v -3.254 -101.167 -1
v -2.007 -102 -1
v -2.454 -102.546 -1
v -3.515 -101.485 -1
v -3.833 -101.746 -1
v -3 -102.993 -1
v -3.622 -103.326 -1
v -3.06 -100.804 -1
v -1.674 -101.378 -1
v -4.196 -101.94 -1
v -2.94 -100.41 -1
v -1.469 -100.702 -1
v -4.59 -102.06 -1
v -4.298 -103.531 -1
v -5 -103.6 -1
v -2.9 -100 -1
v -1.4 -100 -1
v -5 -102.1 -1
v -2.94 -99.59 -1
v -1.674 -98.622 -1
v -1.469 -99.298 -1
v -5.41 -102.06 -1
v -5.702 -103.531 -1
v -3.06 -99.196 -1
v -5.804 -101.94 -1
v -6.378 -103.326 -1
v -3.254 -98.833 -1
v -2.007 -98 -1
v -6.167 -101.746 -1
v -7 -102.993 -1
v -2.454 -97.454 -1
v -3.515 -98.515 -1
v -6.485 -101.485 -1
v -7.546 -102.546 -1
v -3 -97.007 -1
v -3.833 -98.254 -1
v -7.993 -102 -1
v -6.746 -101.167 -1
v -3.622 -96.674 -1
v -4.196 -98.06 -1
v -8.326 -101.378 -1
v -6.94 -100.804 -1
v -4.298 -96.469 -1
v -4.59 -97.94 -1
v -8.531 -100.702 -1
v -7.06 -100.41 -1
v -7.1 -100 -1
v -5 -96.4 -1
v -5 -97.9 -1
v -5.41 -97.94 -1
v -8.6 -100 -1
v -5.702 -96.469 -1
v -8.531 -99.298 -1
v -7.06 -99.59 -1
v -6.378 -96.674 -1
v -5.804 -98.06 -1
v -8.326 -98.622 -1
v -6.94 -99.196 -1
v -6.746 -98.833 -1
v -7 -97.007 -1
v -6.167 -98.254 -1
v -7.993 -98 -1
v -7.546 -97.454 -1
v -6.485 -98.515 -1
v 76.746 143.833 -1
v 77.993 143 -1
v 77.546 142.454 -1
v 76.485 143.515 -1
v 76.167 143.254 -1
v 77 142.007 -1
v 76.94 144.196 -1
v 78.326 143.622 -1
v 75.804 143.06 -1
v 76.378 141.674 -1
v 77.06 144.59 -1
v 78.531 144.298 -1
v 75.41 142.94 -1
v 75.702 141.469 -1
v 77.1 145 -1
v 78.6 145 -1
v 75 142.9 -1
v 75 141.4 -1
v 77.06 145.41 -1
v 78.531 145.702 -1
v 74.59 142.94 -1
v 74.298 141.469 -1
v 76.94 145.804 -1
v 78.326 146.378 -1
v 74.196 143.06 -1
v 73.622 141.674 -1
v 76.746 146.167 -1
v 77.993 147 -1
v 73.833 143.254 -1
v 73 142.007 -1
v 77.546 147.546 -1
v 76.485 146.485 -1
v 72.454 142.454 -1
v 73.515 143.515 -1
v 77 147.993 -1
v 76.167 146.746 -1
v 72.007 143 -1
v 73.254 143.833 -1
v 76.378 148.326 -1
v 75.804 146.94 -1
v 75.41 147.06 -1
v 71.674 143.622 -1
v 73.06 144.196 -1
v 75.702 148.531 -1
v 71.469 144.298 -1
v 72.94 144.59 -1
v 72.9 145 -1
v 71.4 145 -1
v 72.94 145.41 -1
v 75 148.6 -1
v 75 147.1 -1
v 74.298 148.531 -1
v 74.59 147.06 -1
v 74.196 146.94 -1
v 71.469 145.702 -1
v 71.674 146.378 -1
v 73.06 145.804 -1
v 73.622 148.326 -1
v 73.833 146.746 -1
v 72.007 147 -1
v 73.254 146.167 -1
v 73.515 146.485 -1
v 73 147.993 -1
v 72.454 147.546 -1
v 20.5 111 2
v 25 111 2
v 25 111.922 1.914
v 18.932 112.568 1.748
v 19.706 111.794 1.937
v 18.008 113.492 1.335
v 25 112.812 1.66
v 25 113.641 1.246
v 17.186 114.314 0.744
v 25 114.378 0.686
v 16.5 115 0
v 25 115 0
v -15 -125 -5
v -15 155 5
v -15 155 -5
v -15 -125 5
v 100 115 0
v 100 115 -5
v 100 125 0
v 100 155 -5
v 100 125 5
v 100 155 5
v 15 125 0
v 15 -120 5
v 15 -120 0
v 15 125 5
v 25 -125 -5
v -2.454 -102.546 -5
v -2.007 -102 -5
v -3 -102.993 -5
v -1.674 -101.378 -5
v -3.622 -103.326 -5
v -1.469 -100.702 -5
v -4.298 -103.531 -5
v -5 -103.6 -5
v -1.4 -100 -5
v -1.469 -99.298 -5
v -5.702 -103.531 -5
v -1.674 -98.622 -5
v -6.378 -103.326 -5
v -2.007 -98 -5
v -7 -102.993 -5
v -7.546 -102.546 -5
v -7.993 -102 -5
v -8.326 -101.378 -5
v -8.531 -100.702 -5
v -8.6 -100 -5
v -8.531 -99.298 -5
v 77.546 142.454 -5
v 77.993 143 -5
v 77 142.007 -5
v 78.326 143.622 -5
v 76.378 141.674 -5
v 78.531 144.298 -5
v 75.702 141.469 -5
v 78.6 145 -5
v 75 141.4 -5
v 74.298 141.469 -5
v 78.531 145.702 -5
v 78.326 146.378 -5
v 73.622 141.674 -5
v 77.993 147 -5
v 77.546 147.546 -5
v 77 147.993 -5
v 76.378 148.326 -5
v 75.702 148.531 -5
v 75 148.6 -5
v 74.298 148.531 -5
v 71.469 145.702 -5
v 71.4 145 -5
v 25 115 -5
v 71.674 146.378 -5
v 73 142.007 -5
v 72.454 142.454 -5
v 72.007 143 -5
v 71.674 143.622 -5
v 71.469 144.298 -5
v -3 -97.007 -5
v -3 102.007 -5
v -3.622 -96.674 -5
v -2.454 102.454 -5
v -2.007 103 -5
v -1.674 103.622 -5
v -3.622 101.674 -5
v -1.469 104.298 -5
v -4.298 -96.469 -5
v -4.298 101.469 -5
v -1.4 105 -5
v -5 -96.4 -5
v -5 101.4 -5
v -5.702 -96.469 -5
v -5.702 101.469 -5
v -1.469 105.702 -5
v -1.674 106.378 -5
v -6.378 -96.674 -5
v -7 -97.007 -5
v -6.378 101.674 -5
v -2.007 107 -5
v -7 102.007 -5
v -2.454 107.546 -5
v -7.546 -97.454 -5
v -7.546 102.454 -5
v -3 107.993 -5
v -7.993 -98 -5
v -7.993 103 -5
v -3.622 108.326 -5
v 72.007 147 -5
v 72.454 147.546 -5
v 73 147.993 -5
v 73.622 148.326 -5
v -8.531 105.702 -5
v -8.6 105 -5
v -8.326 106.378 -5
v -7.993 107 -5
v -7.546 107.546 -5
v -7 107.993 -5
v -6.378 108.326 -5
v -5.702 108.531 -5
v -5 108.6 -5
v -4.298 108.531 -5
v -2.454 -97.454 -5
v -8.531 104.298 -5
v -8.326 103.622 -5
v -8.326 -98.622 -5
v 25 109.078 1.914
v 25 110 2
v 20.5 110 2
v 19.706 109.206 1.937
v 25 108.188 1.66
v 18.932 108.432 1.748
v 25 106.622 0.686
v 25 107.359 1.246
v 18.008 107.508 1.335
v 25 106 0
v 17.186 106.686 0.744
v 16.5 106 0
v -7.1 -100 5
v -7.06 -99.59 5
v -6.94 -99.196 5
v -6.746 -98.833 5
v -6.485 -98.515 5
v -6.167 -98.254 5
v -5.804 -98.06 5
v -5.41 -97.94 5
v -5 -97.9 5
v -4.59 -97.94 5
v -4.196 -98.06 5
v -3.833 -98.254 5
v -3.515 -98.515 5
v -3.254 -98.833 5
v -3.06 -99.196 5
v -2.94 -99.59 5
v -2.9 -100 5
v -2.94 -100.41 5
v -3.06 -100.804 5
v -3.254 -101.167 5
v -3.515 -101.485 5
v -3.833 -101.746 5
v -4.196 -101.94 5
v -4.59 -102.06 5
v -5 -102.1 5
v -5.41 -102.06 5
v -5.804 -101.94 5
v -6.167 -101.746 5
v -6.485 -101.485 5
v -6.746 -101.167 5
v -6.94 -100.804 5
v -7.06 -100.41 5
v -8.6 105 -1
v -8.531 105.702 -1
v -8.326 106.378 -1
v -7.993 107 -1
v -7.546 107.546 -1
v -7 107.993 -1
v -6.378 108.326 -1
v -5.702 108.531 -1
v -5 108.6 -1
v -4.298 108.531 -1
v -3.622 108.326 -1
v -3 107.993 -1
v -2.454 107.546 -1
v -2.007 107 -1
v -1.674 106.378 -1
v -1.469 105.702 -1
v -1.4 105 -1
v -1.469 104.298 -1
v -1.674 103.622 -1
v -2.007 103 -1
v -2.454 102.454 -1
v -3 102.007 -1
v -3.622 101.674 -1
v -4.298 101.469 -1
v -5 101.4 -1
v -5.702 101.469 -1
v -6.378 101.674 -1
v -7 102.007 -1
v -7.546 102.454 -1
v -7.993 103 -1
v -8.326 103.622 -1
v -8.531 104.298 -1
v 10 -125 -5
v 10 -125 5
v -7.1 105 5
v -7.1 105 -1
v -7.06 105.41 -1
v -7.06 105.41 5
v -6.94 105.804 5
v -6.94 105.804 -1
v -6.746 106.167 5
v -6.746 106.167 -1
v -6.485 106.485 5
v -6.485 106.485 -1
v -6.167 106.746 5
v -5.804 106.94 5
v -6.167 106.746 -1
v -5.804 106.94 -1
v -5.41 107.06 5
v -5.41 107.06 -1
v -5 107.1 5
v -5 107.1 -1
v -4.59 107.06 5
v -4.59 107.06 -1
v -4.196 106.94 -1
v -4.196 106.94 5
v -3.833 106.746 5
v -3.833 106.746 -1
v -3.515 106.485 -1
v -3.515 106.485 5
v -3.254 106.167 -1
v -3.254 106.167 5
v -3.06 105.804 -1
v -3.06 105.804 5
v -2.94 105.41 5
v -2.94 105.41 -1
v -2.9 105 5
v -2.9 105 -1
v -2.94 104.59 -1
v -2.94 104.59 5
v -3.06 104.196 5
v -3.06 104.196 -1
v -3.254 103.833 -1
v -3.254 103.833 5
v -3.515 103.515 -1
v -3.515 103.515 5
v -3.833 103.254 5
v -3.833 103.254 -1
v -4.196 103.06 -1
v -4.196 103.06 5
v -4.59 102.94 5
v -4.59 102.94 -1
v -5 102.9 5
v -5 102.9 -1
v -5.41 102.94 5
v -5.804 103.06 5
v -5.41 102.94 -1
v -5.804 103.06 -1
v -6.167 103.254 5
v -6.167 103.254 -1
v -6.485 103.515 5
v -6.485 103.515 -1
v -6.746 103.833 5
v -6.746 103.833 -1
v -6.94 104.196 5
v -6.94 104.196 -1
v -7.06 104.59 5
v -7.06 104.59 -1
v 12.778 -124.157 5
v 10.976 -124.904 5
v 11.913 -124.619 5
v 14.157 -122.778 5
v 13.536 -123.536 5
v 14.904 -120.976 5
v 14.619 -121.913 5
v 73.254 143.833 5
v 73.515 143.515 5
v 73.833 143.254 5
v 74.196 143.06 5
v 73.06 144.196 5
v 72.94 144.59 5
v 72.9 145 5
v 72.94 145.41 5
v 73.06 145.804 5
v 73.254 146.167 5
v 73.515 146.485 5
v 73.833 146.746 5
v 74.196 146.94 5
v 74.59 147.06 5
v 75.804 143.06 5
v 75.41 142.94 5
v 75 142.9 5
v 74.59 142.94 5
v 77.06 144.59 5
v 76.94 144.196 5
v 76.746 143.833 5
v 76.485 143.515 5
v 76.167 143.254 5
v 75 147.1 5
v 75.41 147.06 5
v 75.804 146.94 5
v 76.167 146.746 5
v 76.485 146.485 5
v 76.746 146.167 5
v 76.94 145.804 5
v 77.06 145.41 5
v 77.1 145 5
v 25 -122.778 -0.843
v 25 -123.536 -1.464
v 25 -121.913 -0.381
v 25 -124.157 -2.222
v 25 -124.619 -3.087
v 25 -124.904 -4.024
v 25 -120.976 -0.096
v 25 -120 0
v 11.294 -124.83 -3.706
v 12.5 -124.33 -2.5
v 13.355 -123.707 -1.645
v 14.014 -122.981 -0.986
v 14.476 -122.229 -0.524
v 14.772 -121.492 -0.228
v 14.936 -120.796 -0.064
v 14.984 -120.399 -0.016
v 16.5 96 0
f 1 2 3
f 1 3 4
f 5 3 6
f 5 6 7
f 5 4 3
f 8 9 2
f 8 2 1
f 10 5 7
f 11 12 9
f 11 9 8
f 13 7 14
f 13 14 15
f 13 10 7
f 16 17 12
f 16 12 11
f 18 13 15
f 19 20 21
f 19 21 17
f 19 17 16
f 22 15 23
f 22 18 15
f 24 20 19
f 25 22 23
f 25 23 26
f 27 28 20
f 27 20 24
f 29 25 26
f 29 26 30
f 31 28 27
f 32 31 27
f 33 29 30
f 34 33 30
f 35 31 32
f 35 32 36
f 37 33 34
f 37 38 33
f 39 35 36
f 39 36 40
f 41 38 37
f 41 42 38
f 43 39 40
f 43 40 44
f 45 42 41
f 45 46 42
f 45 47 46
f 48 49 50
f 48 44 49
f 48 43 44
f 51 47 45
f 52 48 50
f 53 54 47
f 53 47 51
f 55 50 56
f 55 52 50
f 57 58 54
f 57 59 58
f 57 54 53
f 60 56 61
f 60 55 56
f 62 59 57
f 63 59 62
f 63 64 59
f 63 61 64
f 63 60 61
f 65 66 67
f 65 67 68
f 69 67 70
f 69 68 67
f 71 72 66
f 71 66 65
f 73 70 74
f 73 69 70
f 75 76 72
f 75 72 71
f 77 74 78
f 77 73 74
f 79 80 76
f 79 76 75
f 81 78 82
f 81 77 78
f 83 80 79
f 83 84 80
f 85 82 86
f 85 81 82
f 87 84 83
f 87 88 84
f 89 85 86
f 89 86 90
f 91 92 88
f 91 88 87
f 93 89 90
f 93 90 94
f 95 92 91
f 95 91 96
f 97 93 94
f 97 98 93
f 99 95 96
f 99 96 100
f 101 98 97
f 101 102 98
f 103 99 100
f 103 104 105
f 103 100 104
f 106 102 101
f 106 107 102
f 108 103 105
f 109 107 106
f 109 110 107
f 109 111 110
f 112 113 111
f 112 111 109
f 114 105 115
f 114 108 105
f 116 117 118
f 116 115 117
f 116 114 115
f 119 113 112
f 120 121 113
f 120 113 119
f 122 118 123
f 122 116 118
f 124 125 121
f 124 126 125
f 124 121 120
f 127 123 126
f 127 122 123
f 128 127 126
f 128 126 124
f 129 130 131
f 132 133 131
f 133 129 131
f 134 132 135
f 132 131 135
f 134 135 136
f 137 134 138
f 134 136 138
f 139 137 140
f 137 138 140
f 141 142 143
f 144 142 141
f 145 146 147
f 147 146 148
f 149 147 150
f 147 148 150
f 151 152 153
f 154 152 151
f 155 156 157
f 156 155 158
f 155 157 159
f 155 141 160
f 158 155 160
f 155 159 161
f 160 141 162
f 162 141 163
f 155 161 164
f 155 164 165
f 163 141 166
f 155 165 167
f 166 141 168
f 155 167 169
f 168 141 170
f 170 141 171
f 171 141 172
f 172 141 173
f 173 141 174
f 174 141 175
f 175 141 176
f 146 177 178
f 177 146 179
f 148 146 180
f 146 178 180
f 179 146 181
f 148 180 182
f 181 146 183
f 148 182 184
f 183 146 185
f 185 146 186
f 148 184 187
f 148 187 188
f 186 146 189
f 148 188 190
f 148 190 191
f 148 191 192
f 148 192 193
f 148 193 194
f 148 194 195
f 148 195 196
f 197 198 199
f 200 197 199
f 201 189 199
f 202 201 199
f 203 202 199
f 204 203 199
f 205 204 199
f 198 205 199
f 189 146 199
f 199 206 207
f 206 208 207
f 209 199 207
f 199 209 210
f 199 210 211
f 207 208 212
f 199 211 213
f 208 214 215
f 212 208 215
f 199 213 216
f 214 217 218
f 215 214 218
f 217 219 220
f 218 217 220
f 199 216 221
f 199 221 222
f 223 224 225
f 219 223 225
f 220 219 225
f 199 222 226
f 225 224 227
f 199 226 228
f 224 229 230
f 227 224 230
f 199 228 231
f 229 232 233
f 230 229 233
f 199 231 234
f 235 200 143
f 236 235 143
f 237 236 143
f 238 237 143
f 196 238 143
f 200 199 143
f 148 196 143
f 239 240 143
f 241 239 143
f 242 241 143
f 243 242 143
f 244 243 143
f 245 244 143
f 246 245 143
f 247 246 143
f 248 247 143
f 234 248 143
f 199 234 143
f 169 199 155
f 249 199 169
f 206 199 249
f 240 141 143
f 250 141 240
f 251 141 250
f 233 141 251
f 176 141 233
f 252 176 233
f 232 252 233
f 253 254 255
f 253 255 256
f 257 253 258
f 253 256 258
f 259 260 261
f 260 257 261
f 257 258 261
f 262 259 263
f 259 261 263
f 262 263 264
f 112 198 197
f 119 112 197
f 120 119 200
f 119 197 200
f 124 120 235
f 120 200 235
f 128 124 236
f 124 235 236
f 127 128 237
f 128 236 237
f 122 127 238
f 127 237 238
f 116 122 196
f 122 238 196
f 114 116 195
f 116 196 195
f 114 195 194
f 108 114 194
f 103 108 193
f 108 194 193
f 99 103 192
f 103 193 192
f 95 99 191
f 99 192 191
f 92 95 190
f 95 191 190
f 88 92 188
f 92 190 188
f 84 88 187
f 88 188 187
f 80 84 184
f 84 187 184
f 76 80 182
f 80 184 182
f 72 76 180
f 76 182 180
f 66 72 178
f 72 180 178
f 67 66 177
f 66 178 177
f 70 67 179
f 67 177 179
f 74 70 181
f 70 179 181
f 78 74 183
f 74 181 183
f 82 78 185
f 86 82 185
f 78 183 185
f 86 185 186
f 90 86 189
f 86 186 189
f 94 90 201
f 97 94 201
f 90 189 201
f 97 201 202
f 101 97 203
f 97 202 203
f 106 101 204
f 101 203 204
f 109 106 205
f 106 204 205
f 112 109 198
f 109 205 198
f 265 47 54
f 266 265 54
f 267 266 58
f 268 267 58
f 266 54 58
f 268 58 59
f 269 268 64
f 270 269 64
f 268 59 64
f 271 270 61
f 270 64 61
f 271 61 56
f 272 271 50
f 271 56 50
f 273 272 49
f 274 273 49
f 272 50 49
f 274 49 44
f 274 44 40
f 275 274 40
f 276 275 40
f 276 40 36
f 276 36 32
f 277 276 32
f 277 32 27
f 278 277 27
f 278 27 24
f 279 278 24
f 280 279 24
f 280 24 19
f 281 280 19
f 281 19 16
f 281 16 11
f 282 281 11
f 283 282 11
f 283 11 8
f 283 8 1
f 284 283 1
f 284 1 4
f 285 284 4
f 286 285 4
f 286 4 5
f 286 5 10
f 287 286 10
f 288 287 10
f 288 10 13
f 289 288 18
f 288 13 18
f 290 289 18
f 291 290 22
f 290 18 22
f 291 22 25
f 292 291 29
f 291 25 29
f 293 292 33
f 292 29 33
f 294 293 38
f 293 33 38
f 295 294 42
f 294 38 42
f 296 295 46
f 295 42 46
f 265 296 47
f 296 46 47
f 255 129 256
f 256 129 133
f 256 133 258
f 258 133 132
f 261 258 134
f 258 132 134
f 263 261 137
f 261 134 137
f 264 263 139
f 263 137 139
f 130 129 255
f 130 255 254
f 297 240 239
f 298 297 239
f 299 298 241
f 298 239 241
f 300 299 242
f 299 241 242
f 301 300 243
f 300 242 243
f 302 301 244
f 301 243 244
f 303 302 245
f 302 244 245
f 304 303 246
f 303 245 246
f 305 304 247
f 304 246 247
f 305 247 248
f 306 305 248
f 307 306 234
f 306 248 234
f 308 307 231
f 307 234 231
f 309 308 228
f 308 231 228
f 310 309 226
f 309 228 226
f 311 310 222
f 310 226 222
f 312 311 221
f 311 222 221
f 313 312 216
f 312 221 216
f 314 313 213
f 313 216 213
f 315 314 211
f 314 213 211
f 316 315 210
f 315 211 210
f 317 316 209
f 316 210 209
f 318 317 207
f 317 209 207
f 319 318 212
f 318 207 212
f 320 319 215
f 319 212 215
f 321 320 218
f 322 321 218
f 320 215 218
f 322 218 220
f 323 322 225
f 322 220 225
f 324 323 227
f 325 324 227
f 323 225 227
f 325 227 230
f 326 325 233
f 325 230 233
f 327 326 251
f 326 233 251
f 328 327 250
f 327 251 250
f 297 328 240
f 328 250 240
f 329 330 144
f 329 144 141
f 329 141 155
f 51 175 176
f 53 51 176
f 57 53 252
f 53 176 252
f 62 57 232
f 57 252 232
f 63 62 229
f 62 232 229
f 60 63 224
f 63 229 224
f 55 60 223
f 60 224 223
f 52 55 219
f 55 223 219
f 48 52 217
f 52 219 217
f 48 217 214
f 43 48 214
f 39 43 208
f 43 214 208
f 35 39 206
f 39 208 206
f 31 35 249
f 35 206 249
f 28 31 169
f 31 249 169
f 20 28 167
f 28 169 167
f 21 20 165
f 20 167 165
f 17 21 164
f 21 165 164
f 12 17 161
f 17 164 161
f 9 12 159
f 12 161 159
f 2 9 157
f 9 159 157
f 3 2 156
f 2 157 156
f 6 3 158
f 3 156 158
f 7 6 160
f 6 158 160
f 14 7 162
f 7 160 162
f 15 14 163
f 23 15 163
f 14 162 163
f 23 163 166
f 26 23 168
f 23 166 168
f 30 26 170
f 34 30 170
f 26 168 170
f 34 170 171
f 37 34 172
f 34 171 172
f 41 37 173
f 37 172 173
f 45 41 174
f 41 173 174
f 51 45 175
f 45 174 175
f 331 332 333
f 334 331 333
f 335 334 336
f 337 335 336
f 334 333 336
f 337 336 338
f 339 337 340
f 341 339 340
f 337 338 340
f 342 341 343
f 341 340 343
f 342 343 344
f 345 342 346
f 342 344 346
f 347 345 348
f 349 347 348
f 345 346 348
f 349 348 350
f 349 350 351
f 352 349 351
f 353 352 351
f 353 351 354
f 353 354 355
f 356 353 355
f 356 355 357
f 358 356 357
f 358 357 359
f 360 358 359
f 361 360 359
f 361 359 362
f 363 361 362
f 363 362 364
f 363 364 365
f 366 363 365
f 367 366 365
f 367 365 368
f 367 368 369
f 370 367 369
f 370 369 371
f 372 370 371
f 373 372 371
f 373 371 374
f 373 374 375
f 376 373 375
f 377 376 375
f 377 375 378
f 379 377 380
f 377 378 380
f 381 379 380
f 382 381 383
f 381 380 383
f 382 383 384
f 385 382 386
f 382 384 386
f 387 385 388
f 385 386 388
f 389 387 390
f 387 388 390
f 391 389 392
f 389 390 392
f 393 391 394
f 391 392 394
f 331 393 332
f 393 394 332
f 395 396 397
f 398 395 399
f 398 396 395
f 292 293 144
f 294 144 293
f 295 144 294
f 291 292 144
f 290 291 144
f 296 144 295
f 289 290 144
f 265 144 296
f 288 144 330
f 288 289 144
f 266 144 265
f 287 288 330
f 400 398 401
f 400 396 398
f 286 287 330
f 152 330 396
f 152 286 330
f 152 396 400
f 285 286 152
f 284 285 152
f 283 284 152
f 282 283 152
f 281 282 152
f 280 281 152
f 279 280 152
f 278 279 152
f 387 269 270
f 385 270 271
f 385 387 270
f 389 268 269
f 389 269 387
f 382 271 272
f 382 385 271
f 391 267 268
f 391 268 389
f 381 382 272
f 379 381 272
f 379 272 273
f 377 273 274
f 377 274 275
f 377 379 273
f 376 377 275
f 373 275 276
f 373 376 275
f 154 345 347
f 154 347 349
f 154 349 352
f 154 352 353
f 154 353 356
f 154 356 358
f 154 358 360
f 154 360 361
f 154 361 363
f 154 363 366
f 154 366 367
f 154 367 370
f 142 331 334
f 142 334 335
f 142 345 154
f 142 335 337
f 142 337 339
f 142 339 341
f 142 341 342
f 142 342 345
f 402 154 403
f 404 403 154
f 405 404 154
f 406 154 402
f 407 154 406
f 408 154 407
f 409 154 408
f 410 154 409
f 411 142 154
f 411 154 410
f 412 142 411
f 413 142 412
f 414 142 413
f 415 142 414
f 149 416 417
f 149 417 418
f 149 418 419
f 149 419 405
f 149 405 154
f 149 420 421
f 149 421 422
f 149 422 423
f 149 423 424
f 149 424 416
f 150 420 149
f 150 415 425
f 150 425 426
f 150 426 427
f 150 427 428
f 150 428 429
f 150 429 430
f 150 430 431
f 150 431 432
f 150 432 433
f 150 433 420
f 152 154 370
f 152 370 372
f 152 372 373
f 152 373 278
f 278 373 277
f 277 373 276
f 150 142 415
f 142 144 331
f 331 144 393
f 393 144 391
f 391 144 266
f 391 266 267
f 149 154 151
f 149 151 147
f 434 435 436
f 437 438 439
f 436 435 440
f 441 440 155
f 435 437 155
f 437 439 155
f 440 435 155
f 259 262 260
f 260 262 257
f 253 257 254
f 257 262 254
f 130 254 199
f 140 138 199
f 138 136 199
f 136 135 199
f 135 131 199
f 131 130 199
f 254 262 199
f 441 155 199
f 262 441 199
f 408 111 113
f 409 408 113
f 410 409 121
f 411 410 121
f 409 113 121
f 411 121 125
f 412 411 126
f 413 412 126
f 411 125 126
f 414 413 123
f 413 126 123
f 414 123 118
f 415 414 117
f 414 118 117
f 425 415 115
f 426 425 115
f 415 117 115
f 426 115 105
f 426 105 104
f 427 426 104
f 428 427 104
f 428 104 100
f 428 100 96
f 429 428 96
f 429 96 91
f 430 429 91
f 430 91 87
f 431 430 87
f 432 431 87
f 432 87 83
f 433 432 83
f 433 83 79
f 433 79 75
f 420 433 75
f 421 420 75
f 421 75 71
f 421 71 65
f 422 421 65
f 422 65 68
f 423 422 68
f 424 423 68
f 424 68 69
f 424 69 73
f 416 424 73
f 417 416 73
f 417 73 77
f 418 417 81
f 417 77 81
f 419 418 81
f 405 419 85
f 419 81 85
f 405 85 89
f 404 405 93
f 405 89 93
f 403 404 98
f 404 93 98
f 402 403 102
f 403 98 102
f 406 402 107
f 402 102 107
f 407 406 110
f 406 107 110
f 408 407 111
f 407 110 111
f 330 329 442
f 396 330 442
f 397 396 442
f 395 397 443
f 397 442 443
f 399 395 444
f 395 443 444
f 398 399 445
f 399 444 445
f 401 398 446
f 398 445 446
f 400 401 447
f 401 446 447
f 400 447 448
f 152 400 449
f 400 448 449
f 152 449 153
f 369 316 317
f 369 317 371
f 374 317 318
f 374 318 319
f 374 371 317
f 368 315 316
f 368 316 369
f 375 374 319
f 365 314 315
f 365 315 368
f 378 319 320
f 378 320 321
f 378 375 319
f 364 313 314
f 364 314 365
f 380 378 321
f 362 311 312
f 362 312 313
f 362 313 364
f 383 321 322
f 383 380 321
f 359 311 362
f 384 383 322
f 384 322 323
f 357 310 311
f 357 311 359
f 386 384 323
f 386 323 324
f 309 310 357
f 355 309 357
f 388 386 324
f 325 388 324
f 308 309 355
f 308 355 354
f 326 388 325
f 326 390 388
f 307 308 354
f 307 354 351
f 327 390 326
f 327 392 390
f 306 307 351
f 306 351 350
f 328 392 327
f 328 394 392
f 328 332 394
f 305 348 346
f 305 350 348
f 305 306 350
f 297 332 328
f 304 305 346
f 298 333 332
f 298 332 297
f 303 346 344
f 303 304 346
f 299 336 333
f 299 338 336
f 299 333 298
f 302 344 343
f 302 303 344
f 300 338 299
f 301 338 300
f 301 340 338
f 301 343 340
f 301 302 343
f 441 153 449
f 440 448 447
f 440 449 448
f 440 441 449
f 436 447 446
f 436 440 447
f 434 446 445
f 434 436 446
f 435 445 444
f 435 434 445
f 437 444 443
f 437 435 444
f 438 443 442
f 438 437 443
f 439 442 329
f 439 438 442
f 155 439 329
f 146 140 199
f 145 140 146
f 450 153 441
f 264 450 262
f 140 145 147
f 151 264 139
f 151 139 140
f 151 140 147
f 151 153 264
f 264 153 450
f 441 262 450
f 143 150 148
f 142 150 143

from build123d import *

# Parameters (mm, degrees)
SKETCH4_W           = 30
SKETCH4_H           = 250
BOSS_EXTRUDE3_DEPTH = 5
SKETCH5_W           = 85
SKETCH5_H           = 5
BOSS_EXTRUDE4_DEPTH = 10
SKETCH6_W           = 5
SKETCH6_H           = 240
BOSS_EXTRUDE5_DEPTH = 10
SKETCH7_W           = 8.5
SKETCH7_H           = 9
BOSS_EXTRUDE6_DEPTH = 2
FILLET2_R           = 5
FILLET3_R           = 5
SKETCH8_R           = 2.1
CUT_EXTRUDE1_DEPTH  = 432
SKETCH9_R           = 3.6
CUT_EXTRUDE2_DEPTH  = 4


# Some blends are built 0.0001 mm under size
with BuildPart() as part:
    # Sketch4 → Boss-Extrude3 (new, symmetric)
    with BuildSketch(Plane.XY):
        Polygon((-15, 125), (15, 125), (100, 125), (100, 155), (-15, 155), align=None)
        Rectangle(SKETCH4_W, SKETCH4_H)
    extrude(amount=BOSS_EXTRUDE3_DEPTH, both=True)

    # Sketch5 → Boss-Extrude4 (add)
    with BuildSketch(Plane(origin=(15, 125, -5), x_dir=(1, 0, 0), z_dir=(0, -1, 0))):
        with Locations((42.5, 2.5)):
            Rectangle(SKETCH5_W, SKETCH5_H)
    extrude(amount=BOSS_EXTRUDE4_DEPTH)

    # Sketch6 → Boss-Extrude5 (add)
    with BuildSketch(Plane(origin=(15, 0, 0), x_dir=(0, 0, -1), z_dir=(1, 0, 0))):
        with Locations((2.5, -5)):
            Rectangle(SKETCH6_W, SKETCH6_H)
    extrude(amount=BOSS_EXTRUDE5_DEPTH)

    # Sketch7 → Boss-Extrude6 (add)
    with BuildSketch(Plane.XY):
        with Locations((20.75, 110.5)):
            Rectangle(SKETCH7_W, SKETCH7_H)
    extrude(amount=BOSS_EXTRUDE6_DEPTH)

    # Fillet2
    # the kernel refuses this fillet: 5 mm, written as the material it takes off along each edge
    with BuildSketch(Plane(origin=(16.5, 125, 2), x_dir=(0, 0, -1), z_dir=(0, -1, 0))) as fillet2_piece_1:
        with BuildLine():
            CenterArc((5, 4), FILLET2_R, 180, 53.130102354)
            Line((0, 4), (0, 0))
            Line((0, 0), (2, 0))
        make_face()
    extrude(amount=29, mode=Mode.SUBTRACT)
    with BuildSketch(Plane(origin=(35, 115, 2), x_dir=(0, 0, -1), z_dir=(-1, 0, 0)), Plane(origin=(16.5, 106, 2), x_dir=(0, 0, -1), z_dir=(1, 0, 0))) as fillet2_piece_2:
        with BuildLine():
            CenterArc((5, 4), FILLET2_R, 180, 53.130102354)
            Line((0, 4), (0, 0))
            Line((0, 0), (2, 0))
        make_face()
    extrude(amount=18.5, mode=Mode.SUBTRACT)

    # Fillet3
    fillet3_edges = [part.edges().sort_by_distance(p)[0] for p in [
        (15, -125, 2.5),
        (20, -125, 0),
    ]]
    fillet(fillet3_edges, radius=FILLET3_R - 0.0001)  # a hair under: the kernel refuses the full size

    # Sketch8 → Cut-Extrude1 (cut)
    with BuildSketch(Plane(origin=(0, 0, -5), x_dir=(-1, 0, 0), z_dir=(0, 0, -1))):
        with Locations((5, -100)):
            Circle(SKETCH8_R)
        with Locations((5, 105)):
            Circle(SKETCH8_R)
        with Locations((-75, 145)):
            Circle(SKETCH8_R)
    extrude(amount=-CUT_EXTRUDE1_DEPTH, mode=Mode.SUBTRACT)

    # Sketch9 → Cut-Extrude2 (cut)
    with BuildSketch(Plane(origin=(0, 0, -5), x_dir=(-1, 0, 0), z_dir=(0, 0, -1))):
        with Locations((-75, 145)):
            Circle(SKETCH9_R)
        with Locations((5, 105)):
            Circle(SKETCH9_R)
        with Locations((5, -100)):
            Circle(SKETCH9_R)
    extrude(amount=-CUT_EXTRUDE2_DEPTH, mode=Mode.SUBTRACT)


solid = part.part
